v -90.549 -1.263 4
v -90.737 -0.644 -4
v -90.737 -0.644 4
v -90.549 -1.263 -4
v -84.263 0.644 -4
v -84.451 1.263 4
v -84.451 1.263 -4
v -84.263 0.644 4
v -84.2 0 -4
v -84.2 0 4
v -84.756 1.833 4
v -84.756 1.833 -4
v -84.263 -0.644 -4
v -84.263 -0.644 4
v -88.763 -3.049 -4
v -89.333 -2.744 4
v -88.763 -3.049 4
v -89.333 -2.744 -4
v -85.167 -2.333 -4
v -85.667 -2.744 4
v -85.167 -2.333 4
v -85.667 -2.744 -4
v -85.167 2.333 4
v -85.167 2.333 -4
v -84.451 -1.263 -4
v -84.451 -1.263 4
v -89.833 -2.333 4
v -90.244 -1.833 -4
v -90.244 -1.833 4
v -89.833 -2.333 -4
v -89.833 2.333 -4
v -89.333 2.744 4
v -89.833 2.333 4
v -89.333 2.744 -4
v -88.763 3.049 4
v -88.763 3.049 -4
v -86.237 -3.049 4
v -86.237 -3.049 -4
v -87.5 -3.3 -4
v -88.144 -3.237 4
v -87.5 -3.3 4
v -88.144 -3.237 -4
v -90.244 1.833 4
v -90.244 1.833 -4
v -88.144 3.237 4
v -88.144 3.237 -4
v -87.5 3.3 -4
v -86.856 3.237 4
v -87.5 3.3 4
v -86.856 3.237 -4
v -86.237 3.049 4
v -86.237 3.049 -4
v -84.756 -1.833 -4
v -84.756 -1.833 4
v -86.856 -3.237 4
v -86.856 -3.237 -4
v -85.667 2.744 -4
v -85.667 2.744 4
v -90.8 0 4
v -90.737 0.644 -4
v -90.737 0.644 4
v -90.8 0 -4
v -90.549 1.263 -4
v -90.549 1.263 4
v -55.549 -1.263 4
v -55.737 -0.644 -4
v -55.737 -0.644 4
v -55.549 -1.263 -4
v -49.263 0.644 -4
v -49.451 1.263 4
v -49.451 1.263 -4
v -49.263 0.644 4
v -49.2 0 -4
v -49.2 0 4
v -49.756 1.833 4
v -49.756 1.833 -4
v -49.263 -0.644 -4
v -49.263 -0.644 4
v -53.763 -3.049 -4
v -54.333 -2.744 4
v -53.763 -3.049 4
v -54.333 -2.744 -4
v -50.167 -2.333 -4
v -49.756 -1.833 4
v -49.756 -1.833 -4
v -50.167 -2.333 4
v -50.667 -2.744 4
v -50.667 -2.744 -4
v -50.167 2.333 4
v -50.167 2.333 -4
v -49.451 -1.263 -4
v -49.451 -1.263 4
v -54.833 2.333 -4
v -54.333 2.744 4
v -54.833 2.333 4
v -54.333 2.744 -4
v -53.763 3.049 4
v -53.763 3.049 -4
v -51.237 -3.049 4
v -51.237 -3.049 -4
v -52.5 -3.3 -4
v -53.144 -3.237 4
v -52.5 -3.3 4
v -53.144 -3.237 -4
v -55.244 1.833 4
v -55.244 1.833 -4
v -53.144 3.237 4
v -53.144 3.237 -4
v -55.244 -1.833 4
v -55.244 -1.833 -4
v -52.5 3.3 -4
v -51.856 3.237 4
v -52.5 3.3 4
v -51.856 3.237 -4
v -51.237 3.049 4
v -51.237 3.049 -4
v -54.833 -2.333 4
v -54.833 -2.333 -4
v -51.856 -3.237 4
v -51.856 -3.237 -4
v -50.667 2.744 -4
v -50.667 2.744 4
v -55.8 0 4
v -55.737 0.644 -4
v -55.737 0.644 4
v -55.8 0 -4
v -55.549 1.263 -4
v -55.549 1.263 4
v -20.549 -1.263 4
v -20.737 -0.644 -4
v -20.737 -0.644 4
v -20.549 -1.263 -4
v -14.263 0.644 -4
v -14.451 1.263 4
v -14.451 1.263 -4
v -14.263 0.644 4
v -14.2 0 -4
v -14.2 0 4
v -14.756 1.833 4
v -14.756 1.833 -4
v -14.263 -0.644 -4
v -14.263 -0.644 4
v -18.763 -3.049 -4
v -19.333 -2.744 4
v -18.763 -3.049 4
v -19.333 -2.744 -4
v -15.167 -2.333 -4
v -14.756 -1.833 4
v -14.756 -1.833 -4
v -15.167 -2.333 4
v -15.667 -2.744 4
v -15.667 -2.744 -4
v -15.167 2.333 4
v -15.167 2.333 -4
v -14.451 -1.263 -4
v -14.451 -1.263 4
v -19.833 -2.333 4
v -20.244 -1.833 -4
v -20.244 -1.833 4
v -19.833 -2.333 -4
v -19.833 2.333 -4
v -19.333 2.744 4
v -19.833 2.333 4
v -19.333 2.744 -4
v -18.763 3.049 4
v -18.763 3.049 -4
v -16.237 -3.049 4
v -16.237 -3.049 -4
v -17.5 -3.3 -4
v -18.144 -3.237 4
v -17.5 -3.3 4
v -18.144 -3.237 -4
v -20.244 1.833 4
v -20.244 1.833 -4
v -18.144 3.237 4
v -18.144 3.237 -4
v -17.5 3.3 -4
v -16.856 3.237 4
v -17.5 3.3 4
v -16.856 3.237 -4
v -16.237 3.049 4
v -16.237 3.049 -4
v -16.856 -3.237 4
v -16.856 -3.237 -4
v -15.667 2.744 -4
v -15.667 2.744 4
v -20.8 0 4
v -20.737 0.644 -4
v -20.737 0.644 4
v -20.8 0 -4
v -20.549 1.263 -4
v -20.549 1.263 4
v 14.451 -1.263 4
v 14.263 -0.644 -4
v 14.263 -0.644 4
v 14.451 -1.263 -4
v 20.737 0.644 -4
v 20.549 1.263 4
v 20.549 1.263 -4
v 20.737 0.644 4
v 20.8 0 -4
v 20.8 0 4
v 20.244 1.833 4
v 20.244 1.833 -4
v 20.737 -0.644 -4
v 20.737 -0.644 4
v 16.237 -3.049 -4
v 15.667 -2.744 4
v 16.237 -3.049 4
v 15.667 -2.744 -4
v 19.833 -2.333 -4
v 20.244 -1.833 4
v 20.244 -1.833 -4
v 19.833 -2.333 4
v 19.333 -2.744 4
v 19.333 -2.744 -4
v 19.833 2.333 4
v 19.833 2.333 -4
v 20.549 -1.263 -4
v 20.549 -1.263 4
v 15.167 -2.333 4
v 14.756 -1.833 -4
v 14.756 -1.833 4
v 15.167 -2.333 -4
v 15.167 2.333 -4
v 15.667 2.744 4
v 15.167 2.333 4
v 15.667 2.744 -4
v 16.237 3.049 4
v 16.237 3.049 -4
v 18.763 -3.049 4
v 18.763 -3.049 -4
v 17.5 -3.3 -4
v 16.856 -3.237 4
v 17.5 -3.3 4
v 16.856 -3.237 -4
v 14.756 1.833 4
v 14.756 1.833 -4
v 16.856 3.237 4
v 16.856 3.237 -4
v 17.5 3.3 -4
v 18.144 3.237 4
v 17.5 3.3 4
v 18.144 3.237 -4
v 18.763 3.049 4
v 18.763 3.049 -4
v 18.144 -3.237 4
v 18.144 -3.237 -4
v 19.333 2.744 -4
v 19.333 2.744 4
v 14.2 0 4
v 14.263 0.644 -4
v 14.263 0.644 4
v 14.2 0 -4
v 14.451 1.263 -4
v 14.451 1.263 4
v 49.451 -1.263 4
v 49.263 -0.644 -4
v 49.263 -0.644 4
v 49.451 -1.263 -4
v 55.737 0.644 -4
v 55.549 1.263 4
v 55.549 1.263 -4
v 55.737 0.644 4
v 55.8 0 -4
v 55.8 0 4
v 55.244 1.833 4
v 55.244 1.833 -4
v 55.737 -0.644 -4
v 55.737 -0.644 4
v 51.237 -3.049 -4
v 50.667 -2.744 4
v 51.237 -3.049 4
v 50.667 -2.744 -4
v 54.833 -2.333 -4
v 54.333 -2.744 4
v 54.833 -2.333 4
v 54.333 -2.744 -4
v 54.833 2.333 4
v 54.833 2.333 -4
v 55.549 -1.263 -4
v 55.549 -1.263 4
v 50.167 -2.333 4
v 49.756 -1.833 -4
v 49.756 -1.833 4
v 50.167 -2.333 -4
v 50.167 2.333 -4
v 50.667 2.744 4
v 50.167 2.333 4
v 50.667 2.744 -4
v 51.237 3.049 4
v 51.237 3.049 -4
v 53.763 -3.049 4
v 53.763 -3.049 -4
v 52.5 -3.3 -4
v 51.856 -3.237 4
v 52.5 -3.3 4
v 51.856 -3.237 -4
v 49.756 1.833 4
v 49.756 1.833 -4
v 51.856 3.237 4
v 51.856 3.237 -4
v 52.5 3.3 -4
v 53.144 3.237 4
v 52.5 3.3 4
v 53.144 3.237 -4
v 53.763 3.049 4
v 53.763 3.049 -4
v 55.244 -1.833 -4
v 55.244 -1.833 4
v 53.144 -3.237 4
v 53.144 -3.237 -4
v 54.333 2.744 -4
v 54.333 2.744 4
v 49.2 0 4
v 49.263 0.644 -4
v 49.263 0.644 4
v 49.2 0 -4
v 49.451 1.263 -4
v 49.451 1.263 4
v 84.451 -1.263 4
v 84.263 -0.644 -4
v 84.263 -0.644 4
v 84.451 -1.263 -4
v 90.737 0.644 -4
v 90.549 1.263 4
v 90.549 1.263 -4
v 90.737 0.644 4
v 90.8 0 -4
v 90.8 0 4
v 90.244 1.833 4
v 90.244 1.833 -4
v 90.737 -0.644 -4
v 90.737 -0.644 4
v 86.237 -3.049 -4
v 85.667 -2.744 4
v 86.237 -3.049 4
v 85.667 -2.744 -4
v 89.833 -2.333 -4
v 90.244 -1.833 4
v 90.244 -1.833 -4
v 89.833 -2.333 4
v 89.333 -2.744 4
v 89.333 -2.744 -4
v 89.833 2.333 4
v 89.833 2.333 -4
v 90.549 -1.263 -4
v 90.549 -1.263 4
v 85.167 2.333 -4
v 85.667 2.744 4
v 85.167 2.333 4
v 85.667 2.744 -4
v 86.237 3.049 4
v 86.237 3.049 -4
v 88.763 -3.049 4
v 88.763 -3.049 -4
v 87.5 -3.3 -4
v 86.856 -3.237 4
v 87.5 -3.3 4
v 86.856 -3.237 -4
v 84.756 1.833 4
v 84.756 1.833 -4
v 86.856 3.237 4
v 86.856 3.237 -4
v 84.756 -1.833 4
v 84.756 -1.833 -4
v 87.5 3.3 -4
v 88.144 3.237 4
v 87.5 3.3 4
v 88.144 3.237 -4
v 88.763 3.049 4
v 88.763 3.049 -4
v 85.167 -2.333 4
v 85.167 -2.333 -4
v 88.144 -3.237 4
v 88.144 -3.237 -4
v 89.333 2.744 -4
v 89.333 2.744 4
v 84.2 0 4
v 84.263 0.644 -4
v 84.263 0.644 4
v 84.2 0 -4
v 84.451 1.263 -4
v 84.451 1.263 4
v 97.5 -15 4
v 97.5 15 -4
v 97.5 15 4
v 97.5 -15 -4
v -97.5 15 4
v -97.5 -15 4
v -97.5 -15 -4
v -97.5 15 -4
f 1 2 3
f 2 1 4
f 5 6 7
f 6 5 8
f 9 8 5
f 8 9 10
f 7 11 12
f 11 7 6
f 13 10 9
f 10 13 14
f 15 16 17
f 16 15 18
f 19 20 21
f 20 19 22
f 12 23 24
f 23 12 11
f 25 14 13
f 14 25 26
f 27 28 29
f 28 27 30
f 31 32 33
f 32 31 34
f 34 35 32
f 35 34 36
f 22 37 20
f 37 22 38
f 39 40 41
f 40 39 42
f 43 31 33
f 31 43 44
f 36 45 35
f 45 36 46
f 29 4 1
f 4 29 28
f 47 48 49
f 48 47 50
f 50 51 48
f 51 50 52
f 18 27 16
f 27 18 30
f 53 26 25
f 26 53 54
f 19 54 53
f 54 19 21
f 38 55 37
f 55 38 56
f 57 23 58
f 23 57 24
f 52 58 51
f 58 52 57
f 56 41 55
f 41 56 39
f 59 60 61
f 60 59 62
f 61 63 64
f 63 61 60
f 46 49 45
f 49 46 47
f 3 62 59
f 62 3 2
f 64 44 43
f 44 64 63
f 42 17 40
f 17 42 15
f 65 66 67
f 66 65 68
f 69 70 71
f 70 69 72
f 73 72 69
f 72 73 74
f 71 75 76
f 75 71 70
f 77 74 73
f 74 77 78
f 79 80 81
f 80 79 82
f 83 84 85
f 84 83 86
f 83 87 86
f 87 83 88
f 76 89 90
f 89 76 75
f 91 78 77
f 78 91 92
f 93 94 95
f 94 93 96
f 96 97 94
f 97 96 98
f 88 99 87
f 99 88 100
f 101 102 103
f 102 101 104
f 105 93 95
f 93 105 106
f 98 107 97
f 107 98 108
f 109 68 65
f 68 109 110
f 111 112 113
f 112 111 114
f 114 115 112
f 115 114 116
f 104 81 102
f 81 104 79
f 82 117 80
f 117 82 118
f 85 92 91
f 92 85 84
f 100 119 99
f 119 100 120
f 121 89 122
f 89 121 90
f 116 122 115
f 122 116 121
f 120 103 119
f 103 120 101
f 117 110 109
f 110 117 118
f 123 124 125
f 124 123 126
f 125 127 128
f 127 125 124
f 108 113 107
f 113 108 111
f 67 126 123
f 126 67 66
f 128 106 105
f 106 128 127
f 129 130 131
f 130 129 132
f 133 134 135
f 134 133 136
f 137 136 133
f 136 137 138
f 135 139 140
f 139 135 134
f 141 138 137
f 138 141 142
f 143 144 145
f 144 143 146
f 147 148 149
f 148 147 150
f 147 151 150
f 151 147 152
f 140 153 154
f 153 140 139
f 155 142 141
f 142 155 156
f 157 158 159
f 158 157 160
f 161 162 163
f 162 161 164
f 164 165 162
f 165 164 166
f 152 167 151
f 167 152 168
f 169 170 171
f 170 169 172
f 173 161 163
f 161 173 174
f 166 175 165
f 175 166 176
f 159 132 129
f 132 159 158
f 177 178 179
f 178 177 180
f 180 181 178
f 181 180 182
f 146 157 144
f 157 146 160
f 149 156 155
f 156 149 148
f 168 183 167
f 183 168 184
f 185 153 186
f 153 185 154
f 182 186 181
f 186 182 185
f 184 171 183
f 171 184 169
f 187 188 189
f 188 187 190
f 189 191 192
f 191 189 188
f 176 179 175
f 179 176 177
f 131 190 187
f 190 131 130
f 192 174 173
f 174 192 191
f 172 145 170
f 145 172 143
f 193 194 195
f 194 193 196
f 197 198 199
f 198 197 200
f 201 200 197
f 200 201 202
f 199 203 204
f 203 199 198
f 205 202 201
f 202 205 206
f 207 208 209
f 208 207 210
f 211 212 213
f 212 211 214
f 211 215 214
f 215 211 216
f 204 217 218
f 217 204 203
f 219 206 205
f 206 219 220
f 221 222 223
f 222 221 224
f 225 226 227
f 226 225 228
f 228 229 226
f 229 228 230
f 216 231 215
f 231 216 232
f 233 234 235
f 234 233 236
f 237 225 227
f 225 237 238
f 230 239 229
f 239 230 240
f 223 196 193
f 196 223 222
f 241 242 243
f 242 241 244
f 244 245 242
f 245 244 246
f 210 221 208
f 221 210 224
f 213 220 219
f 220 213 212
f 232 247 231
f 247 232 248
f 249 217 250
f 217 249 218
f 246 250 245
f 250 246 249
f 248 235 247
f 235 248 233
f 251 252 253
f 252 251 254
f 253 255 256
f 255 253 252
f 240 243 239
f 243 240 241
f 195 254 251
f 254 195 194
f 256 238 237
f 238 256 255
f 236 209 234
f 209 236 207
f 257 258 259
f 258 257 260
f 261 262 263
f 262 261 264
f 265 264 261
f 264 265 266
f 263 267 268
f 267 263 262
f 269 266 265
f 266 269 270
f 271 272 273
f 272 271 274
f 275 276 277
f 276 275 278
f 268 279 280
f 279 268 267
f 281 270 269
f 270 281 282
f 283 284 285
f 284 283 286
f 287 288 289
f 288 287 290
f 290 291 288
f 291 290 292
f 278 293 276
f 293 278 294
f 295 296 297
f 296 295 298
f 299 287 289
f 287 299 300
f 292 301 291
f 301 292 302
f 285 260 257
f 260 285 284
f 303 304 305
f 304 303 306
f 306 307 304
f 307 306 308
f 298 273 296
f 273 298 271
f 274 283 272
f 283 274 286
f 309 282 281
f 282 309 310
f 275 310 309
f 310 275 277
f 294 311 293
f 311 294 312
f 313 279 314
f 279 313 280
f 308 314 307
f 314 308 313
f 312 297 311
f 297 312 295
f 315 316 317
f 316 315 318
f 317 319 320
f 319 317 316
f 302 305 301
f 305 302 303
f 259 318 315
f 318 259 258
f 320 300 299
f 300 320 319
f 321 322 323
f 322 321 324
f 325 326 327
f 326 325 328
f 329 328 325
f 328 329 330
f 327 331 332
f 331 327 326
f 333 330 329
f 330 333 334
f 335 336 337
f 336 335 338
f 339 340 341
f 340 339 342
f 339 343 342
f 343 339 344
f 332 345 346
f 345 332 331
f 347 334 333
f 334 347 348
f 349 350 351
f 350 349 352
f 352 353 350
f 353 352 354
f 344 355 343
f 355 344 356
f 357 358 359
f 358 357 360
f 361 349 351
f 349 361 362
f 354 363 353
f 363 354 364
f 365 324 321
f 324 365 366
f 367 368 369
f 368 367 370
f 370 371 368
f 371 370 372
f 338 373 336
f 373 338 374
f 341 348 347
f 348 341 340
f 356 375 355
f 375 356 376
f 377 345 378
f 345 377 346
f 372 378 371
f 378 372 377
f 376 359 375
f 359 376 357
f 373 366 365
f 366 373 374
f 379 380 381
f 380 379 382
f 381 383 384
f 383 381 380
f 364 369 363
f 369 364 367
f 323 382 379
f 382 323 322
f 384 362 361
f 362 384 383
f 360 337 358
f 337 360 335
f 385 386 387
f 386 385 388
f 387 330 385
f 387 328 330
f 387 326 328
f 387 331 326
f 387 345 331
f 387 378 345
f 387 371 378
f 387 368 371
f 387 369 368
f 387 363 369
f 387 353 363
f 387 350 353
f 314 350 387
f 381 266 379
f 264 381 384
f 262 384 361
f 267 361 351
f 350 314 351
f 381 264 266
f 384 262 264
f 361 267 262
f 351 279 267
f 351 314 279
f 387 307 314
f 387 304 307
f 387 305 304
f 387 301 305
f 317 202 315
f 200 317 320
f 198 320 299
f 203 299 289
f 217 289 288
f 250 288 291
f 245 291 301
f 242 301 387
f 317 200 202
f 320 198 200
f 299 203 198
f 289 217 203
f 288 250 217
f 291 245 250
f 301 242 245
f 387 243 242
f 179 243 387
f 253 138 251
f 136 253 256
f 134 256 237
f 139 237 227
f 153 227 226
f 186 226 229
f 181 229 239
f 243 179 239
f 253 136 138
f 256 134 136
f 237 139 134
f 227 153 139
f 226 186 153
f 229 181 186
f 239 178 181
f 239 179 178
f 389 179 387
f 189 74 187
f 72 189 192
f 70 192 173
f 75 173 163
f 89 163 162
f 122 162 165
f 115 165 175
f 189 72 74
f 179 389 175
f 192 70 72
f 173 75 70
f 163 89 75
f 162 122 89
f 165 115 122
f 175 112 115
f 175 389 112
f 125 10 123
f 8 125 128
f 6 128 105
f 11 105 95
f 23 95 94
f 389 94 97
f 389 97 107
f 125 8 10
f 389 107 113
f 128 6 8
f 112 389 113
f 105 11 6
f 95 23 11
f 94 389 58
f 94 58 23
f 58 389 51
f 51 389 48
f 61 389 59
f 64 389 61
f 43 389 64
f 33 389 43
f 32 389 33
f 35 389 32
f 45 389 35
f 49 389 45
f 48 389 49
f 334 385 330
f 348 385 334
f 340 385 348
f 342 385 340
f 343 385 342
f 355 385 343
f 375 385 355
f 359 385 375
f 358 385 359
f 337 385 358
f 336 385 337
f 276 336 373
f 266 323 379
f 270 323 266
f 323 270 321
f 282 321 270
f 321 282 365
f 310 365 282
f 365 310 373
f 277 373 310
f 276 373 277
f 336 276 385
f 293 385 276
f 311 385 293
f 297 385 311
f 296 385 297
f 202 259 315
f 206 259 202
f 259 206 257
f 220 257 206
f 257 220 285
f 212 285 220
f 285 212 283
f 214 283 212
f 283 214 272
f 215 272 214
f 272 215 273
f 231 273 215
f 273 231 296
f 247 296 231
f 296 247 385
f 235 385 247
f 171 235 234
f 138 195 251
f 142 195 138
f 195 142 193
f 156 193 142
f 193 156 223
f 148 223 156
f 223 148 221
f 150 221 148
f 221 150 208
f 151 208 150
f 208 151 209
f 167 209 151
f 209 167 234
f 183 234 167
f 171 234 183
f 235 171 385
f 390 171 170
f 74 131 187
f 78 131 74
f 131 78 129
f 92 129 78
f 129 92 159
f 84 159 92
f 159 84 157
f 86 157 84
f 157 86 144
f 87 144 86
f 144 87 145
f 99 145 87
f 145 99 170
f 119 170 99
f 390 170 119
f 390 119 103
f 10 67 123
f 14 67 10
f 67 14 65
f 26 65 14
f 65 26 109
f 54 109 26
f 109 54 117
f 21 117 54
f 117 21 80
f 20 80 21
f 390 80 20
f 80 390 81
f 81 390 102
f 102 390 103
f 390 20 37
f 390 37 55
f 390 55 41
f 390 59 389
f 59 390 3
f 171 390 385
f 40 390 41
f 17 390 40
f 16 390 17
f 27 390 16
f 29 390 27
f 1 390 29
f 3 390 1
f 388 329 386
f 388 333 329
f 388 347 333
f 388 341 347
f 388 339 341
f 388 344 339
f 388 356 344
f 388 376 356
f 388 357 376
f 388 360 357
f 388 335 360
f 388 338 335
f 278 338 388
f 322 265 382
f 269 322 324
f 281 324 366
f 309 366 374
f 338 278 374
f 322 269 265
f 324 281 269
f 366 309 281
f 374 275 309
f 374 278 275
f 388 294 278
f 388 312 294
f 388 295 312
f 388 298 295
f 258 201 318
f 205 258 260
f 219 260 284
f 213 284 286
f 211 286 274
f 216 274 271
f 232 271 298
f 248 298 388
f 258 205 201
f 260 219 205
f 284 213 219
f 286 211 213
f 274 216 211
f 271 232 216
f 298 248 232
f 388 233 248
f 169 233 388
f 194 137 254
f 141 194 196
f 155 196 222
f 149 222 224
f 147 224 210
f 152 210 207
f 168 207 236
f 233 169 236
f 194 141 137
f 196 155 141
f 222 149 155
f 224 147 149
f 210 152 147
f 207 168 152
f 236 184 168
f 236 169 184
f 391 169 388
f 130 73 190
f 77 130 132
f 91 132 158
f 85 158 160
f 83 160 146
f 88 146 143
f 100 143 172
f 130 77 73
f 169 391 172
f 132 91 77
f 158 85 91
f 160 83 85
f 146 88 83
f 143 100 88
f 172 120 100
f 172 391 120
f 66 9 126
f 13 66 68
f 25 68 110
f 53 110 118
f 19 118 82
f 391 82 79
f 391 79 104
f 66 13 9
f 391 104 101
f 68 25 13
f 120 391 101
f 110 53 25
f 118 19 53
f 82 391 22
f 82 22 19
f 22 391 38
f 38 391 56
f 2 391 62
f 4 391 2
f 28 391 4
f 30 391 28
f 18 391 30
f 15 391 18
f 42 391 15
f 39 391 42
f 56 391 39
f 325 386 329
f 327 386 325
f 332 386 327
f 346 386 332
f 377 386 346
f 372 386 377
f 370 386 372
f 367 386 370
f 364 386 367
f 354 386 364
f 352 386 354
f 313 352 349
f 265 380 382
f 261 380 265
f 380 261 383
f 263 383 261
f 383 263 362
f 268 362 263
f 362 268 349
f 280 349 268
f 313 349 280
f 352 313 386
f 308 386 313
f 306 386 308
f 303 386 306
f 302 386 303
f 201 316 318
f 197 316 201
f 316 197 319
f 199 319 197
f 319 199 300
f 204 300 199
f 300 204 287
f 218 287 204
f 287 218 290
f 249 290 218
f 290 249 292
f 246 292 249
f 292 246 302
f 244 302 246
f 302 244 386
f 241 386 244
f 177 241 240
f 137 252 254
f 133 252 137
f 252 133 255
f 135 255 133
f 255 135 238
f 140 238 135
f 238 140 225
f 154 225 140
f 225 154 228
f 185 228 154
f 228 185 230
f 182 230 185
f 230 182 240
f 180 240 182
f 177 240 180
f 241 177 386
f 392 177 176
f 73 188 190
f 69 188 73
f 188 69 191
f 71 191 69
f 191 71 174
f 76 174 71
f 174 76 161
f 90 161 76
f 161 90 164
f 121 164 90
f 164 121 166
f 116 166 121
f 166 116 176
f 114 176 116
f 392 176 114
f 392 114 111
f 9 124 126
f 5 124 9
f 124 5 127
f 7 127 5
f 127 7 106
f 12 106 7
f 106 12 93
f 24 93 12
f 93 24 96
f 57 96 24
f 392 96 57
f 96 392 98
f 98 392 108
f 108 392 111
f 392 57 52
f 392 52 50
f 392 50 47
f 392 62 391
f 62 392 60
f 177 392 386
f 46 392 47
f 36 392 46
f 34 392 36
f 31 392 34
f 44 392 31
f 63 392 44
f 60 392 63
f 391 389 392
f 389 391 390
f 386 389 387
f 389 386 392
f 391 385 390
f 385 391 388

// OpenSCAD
$fn = 32;

// ----------------------------------------------------------------------
// Hole bar, 6 x Ø6.6
// row layout, 10 mm edge offset
// ----------------------------------------------------------------------

// --- parameters (mm) ---
bar_w = 30;    // bar width (Y)
bar_t = 8;     // bar thickness (Z)
holes = 6;     // holes per row
hole_d = 6.6;  // hole diameter
edge = 10;     // offset from the bar end to the first hole
pitch = 35;    // pitch between neighbouring holes

// --- derived feature positions (mm) ---
span = (holes - 1) * pitch;   // = 175   distance between the end holes
bar_l = span + 2 * edge;      // = 195   overall bar length
start_x = -bar_l / 2 + edge;  // = -87.5   X of the first hole
feature_centers = [
  [start_x + 0 * pitch, 0],
  [start_x + 1 * pitch, 0],
  [start_x + 2 * pitch, 0],
  [start_x + 3 * pitch, 0],
  [start_x + 4 * pitch, 0],
  [start_x + 5 * pitch, 0]
];   // hole centres of the first row

// bar with one row of holes, drilled from feature_centers
difference() {
  translate([-bar_l / 2, -bar_w / 2, -bar_t / 2]) cube([bar_l, bar_w, bar_t]);
  for (centre = feature_centers)
    translate([centre[0], centre[1], 0])
      cylinder(d = hole_d, h = bar_t + 2, center = true);
}
